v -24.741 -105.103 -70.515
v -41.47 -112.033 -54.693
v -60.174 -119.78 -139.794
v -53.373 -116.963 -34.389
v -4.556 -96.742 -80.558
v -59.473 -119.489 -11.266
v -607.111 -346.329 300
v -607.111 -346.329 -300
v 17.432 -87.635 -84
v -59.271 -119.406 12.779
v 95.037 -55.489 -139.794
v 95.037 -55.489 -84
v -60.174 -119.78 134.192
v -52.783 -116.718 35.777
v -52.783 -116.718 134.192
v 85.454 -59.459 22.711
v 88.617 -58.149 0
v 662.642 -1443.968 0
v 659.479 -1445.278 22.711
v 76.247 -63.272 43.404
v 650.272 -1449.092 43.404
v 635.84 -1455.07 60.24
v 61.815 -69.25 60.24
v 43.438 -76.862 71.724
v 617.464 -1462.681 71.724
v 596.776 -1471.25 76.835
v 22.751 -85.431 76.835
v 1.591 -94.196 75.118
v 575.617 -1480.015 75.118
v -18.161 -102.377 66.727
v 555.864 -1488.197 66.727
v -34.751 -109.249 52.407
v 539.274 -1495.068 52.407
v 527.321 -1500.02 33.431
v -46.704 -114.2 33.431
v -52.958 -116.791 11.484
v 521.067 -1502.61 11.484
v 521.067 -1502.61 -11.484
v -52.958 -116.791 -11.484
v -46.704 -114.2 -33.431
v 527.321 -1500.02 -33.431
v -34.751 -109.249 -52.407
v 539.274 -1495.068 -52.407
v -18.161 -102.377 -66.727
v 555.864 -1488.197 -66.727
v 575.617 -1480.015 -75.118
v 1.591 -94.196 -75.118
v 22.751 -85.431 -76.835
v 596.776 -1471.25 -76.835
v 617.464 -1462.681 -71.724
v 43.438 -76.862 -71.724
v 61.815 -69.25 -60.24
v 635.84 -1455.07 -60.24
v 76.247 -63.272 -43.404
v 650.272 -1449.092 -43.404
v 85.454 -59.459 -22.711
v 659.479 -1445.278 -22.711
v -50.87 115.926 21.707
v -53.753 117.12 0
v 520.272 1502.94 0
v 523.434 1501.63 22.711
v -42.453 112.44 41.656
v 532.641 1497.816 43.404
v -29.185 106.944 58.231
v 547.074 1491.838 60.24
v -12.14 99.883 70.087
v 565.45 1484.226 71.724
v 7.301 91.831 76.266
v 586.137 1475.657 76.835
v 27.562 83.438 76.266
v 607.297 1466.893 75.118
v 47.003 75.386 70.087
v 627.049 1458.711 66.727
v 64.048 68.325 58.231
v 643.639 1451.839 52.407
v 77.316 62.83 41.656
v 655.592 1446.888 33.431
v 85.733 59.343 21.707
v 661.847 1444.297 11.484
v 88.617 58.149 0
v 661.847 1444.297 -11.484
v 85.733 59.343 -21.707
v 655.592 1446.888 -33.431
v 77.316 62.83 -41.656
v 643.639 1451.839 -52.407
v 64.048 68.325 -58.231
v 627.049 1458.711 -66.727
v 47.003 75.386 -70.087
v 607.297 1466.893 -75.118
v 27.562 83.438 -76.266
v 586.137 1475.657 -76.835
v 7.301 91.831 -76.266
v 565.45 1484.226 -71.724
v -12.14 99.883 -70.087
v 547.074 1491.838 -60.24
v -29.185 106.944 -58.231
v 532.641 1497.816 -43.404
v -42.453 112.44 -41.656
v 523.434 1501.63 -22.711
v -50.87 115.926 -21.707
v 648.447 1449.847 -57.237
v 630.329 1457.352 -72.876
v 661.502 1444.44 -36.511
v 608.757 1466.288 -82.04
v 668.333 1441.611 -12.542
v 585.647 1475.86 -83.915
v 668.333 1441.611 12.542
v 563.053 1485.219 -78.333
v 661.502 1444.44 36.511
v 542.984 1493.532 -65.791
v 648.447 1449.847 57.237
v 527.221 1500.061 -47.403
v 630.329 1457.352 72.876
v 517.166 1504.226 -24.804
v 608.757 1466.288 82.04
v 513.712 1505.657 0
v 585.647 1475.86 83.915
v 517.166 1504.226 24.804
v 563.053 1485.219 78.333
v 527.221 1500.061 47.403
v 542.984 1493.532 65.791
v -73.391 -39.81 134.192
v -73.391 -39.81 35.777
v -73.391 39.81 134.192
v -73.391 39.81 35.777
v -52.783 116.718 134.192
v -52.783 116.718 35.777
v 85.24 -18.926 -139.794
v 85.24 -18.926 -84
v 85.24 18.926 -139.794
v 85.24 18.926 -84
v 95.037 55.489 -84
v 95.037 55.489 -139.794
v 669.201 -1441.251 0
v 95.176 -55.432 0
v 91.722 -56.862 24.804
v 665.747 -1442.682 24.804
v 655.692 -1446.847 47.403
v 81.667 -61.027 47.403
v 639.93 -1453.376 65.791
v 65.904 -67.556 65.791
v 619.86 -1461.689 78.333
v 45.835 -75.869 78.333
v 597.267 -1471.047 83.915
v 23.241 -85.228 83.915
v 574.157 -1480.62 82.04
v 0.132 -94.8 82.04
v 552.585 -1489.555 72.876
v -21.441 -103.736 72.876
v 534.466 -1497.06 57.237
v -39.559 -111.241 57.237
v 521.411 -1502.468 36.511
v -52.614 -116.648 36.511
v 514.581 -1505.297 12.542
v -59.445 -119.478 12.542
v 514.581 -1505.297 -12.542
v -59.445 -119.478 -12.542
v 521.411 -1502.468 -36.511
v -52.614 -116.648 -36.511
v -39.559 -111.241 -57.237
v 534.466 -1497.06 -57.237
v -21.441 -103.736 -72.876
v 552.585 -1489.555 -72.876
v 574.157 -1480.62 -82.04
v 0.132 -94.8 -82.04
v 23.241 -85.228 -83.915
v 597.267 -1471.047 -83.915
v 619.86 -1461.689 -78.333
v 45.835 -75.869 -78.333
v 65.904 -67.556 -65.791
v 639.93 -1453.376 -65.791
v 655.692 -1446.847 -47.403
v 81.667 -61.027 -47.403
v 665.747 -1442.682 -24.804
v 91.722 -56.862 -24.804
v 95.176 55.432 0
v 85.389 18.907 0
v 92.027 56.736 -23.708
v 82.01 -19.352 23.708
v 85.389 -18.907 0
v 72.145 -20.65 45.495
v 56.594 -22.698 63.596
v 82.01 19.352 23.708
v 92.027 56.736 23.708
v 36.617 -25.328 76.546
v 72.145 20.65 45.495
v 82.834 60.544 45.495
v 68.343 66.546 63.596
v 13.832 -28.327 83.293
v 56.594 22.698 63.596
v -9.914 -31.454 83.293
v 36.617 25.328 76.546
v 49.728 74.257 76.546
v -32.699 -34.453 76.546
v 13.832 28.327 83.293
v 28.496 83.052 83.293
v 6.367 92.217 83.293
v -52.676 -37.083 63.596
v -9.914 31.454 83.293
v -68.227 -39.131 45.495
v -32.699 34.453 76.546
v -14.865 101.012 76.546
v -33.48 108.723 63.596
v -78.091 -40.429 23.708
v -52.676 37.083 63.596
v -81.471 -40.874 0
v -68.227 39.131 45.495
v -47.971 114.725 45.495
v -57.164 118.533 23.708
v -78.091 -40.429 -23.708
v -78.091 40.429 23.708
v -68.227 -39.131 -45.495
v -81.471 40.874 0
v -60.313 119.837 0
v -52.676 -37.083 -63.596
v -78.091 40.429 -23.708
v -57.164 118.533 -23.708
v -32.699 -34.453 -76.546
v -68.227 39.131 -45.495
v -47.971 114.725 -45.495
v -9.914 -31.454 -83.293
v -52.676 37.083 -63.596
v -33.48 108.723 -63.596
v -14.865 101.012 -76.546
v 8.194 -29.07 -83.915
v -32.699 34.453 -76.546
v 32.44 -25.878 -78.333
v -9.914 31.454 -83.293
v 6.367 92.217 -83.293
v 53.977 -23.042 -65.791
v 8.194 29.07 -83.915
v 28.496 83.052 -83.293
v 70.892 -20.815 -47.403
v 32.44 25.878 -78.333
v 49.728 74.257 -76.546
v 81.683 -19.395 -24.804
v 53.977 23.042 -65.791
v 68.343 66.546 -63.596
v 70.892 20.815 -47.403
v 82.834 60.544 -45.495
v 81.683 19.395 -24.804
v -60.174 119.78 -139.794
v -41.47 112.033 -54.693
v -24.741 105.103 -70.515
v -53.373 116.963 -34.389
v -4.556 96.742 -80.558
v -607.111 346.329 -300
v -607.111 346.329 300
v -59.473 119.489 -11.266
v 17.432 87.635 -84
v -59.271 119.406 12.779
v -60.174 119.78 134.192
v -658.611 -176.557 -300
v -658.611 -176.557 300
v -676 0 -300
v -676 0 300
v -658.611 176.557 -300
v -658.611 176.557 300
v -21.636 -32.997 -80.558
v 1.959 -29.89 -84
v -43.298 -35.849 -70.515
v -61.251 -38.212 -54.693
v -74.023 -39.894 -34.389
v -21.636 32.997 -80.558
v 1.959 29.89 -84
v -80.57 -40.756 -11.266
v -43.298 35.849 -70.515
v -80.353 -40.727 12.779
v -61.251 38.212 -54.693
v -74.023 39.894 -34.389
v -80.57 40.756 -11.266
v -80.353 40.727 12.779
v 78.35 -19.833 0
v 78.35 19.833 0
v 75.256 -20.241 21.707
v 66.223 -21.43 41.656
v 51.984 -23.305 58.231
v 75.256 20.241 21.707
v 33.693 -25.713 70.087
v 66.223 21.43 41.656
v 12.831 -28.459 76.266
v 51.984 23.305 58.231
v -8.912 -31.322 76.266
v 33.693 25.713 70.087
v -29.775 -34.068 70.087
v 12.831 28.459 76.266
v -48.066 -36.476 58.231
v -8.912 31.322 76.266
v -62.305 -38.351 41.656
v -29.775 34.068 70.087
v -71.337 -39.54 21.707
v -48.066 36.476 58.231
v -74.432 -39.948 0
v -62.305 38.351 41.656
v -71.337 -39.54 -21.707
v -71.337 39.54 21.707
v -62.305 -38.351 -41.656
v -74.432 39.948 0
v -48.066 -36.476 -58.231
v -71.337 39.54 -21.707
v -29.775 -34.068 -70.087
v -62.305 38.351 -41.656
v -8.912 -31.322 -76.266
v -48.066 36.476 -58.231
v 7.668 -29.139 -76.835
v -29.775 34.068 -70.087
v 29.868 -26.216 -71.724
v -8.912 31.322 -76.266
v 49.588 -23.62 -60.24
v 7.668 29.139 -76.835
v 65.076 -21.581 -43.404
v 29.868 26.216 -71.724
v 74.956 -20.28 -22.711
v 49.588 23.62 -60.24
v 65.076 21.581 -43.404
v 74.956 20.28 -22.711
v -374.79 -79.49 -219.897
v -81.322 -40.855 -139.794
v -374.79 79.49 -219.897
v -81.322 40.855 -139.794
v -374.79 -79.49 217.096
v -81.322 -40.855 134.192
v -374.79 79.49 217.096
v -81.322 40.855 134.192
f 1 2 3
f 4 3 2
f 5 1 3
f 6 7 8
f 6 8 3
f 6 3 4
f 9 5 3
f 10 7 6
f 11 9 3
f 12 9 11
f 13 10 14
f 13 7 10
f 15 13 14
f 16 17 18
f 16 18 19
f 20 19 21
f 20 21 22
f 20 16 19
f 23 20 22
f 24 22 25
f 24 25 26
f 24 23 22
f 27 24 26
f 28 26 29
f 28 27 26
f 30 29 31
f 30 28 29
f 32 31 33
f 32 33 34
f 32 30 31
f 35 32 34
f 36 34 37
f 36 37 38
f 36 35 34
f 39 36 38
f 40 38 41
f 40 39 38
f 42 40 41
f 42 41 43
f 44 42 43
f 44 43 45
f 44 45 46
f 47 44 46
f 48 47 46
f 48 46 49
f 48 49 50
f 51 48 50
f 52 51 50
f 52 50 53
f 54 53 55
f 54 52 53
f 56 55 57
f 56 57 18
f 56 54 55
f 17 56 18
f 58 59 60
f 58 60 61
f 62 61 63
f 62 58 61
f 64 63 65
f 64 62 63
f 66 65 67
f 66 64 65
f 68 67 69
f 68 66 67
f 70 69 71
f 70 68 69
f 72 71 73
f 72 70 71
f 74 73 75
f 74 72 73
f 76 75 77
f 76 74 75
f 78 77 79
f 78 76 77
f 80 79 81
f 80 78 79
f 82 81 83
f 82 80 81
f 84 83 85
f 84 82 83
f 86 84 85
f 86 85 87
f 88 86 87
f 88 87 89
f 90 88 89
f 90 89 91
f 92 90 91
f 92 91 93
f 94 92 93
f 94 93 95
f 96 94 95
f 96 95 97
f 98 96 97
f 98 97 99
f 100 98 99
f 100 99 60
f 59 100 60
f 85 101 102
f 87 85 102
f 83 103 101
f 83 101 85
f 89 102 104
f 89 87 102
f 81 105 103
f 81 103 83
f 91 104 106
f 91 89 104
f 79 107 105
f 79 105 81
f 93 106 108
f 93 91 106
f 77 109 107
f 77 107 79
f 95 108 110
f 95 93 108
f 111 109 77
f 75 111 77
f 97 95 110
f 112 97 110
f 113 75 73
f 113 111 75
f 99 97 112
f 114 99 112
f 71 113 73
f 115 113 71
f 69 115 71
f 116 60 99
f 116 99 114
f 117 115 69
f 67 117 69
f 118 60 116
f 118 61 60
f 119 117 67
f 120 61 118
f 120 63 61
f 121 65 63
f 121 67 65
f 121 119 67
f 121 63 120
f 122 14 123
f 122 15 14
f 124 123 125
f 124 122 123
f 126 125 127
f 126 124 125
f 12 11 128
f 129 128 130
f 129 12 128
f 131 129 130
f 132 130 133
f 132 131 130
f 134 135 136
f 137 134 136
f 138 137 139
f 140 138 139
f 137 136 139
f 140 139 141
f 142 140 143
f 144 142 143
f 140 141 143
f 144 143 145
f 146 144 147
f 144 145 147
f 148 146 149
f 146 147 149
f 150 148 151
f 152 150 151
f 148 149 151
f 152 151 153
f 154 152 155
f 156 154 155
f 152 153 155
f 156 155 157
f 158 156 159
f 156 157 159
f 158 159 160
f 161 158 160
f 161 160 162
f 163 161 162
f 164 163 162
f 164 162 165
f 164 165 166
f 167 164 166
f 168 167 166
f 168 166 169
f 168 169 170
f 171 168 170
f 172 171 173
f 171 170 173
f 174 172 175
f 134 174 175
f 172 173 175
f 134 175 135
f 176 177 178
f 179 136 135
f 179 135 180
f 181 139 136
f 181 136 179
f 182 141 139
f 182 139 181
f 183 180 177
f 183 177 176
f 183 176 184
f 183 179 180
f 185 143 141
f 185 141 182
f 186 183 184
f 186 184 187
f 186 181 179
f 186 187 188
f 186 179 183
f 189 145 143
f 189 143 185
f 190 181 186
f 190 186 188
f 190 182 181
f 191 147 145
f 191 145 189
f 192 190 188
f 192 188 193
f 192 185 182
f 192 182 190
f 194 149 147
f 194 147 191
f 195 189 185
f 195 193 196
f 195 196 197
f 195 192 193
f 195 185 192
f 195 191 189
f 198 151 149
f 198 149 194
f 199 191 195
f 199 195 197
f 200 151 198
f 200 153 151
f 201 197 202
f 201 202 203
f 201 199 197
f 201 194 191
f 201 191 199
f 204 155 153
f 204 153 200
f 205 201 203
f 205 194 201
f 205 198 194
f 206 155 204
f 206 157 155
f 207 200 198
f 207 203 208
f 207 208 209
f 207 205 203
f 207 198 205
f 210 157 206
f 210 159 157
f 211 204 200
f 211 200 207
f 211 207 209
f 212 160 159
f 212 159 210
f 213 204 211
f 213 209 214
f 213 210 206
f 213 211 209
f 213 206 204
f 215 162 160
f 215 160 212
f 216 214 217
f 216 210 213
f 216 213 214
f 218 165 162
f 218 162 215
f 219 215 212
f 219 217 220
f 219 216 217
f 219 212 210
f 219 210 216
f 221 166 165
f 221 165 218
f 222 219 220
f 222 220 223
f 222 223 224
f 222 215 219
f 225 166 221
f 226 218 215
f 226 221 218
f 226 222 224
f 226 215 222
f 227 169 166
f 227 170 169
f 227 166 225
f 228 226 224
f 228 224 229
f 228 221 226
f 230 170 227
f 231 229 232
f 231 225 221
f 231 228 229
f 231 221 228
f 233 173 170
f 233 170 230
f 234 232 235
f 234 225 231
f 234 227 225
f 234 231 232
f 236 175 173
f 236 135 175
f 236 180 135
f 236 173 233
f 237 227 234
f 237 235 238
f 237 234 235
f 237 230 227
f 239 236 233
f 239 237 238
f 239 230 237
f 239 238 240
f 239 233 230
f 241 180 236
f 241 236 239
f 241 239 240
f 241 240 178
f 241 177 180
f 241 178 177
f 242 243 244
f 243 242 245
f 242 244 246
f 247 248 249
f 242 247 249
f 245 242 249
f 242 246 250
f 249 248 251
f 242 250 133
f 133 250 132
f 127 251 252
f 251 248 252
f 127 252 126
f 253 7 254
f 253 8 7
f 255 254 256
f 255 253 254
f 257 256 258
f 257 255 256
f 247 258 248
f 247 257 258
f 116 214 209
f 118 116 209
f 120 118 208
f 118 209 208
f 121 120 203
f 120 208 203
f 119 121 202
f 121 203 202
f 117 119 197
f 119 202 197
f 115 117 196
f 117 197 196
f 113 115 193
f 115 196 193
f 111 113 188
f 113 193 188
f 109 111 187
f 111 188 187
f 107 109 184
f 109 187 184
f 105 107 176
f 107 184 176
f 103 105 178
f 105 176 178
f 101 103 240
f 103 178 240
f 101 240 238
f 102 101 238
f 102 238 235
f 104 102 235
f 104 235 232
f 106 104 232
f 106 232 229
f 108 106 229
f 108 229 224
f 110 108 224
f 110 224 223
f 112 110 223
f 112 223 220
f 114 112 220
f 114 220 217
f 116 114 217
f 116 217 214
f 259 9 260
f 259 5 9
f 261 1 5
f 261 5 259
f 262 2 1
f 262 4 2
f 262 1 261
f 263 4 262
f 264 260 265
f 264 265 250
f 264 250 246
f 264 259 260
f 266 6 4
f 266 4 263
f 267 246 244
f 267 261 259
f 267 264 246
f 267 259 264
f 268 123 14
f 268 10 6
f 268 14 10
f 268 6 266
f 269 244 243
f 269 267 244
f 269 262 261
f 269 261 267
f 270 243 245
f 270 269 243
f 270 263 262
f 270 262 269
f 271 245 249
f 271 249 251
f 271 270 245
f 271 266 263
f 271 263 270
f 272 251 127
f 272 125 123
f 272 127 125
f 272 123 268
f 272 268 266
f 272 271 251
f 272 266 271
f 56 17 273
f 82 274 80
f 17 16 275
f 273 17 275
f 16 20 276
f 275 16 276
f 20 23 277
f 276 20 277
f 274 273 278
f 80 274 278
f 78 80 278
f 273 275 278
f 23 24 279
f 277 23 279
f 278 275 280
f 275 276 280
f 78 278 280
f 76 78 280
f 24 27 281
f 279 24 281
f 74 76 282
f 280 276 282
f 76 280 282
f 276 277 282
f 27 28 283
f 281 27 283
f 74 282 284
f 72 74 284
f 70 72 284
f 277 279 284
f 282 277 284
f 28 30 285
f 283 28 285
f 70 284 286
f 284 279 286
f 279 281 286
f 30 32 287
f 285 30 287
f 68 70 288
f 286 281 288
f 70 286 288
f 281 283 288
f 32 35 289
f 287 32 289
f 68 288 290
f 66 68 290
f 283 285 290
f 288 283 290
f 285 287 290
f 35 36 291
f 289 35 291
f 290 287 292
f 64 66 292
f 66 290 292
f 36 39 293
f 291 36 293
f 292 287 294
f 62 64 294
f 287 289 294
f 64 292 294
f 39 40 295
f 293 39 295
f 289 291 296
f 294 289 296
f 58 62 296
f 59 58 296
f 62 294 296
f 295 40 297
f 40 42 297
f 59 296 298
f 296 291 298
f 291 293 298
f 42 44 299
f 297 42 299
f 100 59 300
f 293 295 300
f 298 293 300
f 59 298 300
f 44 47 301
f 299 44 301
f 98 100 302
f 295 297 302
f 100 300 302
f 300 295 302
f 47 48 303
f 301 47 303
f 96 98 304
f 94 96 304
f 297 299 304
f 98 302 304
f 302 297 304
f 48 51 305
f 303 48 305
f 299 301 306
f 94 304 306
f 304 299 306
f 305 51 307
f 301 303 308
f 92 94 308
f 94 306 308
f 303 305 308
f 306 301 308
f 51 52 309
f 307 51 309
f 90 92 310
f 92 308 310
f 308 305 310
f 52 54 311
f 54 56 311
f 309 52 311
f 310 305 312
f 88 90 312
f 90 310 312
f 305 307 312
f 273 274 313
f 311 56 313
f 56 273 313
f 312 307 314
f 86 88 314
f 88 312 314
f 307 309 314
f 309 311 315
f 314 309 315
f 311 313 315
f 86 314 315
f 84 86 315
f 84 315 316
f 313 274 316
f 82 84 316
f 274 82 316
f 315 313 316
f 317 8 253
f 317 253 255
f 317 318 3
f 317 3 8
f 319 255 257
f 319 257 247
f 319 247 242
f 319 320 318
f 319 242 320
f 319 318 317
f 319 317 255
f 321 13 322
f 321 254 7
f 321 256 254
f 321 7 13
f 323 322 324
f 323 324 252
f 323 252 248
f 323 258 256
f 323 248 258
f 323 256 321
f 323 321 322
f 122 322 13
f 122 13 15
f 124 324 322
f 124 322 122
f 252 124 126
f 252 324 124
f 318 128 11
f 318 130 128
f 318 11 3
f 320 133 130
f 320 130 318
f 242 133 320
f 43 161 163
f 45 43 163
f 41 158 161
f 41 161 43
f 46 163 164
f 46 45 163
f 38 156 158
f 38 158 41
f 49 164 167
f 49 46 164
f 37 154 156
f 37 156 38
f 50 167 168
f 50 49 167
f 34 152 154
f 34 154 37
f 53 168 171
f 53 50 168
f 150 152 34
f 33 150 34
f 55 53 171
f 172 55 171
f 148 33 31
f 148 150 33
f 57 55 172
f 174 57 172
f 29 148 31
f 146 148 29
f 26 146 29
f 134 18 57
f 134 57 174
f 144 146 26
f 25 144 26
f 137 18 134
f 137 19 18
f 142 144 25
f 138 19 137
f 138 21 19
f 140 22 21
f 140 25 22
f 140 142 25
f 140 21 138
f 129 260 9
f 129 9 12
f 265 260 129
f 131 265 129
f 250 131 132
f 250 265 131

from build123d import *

# Parameters (mm, degrees)
F0_R          = 84.15
F0_R_2        = 77.05
F1_ANGLE_BACK = 22.5
F1_ANGLE      = 45
F2_R          = 84.15
F2_R_2        = 77.05
F3_DEPTH      = 1500
F4_R          = 84.15
F4_R_2        = 77.05
F5_DEPTH      = 1500
F6_R          = 77.05
F7_ANGLE_BACK = 22.5
F7_ANGLE      = 45
F9_ANGLE_BACK = 22.5
F9_ANGLE      = 45


with BuildPart() as f1:
    # F0 (on Front) → F1 (revolve)
    with BuildSketch(Plane.XZ, mode=Mode.PRIVATE) as f1_sk:
        Circle(F0_R)
        Circle(F0_R_2, mode=Mode.SUBTRACT)
    revolve(f1_sk.sketch.rotate(Axis((229, 0, -0.4341155291), (0, 0, -1)), -F1_ANGLE_BACK), axis=Axis((229, 0, -0.4341155291), (0, 0, -1)), revolution_arc=F1_ANGLE)

    # F2 (on face) → F3 (join)
    with BuildSketch(Plane(origin=(33.5362735541, -80.9637264459, 0), x_dir=(0.9238795325, 0.3826834324, 0), z_dir=(0.3826834324, -0.9238795325, 0))):
        with Locations((-17.4315870549, 0)):
            Circle(F2_R)
        with Locations((-17.4315870549, 0)):
            Circle(F2_R_2, mode=Mode.SUBTRACT)
    extrude(amount=F3_DEPTH)

    # F4 (on face) → F5 (join)
    with BuildSketch(Plane(origin=(33.5362735541, 80.9637264459, 0), x_dir=(-0.9238795325, 0.3826834324, 0), z_dir=(0.3826834324, 0.9238795325, 0))):
        with Locations((17.4315870549, 0)):
            Circle(F4_R)
        with Locations((17.4315870549, 0)):
            Circle(F4_R_2, mode=Mode.SUBTRACT)
    extrude(amount=F5_DEPTH)

    # F6 (on Front) → F7 (revolve, cut)
    with BuildSketch(Plane.XZ, mode=Mode.PRIVATE) as f7_sk:
        Circle(F6_R)
    revolve(f7_sk.sketch.rotate(Axis((229, 0, -9.7871497273), (0, 0, 1)), -F7_ANGLE_BACK), axis=Axis((229, 0, -9.7871497273), (0, 0, 1)), revolution_arc=F7_ANGLE, mode=Mode.SUBTRACT)


with BuildPart() as f9:
    # F8 (on Front) → F9 (revolve)
    with BuildSketch(Plane.XZ, mode=Mode.PRIVATE) as f9_sk:
        with BuildLine():
            ThreePointArc((0, -84), (-70.9269883816, -45.0040255879), (-76, 35.77708764))
            Line((-76, 35.77708764), (-76, 134.1918259859))
            Line((-76, 134.1918259859), (-84, 134.1918259859))
            Line((-84, 134.1918259859), (-676, 300))
            Line((-676, 300), (-676, -300))
            Line((-676, -300), (-84, -139.79357481))
            Line((-84, -139.79357481), (84, -139.79357481))
            Line((84, -139.79357481), (84, -84))
            Line((84, -84), (0, -84))
        make_face()
    revolve(f9_sk.sketch.rotate(Axis((229, 0, -6.6939145327), (0, 0, -1)), -F9_ANGLE_BACK), axis=Axis((229, 0, -6.6939145327), (0, 0, -1)), revolution_arc=F9_ANGLE)


solid = Compound([f1.part, f9.part])
